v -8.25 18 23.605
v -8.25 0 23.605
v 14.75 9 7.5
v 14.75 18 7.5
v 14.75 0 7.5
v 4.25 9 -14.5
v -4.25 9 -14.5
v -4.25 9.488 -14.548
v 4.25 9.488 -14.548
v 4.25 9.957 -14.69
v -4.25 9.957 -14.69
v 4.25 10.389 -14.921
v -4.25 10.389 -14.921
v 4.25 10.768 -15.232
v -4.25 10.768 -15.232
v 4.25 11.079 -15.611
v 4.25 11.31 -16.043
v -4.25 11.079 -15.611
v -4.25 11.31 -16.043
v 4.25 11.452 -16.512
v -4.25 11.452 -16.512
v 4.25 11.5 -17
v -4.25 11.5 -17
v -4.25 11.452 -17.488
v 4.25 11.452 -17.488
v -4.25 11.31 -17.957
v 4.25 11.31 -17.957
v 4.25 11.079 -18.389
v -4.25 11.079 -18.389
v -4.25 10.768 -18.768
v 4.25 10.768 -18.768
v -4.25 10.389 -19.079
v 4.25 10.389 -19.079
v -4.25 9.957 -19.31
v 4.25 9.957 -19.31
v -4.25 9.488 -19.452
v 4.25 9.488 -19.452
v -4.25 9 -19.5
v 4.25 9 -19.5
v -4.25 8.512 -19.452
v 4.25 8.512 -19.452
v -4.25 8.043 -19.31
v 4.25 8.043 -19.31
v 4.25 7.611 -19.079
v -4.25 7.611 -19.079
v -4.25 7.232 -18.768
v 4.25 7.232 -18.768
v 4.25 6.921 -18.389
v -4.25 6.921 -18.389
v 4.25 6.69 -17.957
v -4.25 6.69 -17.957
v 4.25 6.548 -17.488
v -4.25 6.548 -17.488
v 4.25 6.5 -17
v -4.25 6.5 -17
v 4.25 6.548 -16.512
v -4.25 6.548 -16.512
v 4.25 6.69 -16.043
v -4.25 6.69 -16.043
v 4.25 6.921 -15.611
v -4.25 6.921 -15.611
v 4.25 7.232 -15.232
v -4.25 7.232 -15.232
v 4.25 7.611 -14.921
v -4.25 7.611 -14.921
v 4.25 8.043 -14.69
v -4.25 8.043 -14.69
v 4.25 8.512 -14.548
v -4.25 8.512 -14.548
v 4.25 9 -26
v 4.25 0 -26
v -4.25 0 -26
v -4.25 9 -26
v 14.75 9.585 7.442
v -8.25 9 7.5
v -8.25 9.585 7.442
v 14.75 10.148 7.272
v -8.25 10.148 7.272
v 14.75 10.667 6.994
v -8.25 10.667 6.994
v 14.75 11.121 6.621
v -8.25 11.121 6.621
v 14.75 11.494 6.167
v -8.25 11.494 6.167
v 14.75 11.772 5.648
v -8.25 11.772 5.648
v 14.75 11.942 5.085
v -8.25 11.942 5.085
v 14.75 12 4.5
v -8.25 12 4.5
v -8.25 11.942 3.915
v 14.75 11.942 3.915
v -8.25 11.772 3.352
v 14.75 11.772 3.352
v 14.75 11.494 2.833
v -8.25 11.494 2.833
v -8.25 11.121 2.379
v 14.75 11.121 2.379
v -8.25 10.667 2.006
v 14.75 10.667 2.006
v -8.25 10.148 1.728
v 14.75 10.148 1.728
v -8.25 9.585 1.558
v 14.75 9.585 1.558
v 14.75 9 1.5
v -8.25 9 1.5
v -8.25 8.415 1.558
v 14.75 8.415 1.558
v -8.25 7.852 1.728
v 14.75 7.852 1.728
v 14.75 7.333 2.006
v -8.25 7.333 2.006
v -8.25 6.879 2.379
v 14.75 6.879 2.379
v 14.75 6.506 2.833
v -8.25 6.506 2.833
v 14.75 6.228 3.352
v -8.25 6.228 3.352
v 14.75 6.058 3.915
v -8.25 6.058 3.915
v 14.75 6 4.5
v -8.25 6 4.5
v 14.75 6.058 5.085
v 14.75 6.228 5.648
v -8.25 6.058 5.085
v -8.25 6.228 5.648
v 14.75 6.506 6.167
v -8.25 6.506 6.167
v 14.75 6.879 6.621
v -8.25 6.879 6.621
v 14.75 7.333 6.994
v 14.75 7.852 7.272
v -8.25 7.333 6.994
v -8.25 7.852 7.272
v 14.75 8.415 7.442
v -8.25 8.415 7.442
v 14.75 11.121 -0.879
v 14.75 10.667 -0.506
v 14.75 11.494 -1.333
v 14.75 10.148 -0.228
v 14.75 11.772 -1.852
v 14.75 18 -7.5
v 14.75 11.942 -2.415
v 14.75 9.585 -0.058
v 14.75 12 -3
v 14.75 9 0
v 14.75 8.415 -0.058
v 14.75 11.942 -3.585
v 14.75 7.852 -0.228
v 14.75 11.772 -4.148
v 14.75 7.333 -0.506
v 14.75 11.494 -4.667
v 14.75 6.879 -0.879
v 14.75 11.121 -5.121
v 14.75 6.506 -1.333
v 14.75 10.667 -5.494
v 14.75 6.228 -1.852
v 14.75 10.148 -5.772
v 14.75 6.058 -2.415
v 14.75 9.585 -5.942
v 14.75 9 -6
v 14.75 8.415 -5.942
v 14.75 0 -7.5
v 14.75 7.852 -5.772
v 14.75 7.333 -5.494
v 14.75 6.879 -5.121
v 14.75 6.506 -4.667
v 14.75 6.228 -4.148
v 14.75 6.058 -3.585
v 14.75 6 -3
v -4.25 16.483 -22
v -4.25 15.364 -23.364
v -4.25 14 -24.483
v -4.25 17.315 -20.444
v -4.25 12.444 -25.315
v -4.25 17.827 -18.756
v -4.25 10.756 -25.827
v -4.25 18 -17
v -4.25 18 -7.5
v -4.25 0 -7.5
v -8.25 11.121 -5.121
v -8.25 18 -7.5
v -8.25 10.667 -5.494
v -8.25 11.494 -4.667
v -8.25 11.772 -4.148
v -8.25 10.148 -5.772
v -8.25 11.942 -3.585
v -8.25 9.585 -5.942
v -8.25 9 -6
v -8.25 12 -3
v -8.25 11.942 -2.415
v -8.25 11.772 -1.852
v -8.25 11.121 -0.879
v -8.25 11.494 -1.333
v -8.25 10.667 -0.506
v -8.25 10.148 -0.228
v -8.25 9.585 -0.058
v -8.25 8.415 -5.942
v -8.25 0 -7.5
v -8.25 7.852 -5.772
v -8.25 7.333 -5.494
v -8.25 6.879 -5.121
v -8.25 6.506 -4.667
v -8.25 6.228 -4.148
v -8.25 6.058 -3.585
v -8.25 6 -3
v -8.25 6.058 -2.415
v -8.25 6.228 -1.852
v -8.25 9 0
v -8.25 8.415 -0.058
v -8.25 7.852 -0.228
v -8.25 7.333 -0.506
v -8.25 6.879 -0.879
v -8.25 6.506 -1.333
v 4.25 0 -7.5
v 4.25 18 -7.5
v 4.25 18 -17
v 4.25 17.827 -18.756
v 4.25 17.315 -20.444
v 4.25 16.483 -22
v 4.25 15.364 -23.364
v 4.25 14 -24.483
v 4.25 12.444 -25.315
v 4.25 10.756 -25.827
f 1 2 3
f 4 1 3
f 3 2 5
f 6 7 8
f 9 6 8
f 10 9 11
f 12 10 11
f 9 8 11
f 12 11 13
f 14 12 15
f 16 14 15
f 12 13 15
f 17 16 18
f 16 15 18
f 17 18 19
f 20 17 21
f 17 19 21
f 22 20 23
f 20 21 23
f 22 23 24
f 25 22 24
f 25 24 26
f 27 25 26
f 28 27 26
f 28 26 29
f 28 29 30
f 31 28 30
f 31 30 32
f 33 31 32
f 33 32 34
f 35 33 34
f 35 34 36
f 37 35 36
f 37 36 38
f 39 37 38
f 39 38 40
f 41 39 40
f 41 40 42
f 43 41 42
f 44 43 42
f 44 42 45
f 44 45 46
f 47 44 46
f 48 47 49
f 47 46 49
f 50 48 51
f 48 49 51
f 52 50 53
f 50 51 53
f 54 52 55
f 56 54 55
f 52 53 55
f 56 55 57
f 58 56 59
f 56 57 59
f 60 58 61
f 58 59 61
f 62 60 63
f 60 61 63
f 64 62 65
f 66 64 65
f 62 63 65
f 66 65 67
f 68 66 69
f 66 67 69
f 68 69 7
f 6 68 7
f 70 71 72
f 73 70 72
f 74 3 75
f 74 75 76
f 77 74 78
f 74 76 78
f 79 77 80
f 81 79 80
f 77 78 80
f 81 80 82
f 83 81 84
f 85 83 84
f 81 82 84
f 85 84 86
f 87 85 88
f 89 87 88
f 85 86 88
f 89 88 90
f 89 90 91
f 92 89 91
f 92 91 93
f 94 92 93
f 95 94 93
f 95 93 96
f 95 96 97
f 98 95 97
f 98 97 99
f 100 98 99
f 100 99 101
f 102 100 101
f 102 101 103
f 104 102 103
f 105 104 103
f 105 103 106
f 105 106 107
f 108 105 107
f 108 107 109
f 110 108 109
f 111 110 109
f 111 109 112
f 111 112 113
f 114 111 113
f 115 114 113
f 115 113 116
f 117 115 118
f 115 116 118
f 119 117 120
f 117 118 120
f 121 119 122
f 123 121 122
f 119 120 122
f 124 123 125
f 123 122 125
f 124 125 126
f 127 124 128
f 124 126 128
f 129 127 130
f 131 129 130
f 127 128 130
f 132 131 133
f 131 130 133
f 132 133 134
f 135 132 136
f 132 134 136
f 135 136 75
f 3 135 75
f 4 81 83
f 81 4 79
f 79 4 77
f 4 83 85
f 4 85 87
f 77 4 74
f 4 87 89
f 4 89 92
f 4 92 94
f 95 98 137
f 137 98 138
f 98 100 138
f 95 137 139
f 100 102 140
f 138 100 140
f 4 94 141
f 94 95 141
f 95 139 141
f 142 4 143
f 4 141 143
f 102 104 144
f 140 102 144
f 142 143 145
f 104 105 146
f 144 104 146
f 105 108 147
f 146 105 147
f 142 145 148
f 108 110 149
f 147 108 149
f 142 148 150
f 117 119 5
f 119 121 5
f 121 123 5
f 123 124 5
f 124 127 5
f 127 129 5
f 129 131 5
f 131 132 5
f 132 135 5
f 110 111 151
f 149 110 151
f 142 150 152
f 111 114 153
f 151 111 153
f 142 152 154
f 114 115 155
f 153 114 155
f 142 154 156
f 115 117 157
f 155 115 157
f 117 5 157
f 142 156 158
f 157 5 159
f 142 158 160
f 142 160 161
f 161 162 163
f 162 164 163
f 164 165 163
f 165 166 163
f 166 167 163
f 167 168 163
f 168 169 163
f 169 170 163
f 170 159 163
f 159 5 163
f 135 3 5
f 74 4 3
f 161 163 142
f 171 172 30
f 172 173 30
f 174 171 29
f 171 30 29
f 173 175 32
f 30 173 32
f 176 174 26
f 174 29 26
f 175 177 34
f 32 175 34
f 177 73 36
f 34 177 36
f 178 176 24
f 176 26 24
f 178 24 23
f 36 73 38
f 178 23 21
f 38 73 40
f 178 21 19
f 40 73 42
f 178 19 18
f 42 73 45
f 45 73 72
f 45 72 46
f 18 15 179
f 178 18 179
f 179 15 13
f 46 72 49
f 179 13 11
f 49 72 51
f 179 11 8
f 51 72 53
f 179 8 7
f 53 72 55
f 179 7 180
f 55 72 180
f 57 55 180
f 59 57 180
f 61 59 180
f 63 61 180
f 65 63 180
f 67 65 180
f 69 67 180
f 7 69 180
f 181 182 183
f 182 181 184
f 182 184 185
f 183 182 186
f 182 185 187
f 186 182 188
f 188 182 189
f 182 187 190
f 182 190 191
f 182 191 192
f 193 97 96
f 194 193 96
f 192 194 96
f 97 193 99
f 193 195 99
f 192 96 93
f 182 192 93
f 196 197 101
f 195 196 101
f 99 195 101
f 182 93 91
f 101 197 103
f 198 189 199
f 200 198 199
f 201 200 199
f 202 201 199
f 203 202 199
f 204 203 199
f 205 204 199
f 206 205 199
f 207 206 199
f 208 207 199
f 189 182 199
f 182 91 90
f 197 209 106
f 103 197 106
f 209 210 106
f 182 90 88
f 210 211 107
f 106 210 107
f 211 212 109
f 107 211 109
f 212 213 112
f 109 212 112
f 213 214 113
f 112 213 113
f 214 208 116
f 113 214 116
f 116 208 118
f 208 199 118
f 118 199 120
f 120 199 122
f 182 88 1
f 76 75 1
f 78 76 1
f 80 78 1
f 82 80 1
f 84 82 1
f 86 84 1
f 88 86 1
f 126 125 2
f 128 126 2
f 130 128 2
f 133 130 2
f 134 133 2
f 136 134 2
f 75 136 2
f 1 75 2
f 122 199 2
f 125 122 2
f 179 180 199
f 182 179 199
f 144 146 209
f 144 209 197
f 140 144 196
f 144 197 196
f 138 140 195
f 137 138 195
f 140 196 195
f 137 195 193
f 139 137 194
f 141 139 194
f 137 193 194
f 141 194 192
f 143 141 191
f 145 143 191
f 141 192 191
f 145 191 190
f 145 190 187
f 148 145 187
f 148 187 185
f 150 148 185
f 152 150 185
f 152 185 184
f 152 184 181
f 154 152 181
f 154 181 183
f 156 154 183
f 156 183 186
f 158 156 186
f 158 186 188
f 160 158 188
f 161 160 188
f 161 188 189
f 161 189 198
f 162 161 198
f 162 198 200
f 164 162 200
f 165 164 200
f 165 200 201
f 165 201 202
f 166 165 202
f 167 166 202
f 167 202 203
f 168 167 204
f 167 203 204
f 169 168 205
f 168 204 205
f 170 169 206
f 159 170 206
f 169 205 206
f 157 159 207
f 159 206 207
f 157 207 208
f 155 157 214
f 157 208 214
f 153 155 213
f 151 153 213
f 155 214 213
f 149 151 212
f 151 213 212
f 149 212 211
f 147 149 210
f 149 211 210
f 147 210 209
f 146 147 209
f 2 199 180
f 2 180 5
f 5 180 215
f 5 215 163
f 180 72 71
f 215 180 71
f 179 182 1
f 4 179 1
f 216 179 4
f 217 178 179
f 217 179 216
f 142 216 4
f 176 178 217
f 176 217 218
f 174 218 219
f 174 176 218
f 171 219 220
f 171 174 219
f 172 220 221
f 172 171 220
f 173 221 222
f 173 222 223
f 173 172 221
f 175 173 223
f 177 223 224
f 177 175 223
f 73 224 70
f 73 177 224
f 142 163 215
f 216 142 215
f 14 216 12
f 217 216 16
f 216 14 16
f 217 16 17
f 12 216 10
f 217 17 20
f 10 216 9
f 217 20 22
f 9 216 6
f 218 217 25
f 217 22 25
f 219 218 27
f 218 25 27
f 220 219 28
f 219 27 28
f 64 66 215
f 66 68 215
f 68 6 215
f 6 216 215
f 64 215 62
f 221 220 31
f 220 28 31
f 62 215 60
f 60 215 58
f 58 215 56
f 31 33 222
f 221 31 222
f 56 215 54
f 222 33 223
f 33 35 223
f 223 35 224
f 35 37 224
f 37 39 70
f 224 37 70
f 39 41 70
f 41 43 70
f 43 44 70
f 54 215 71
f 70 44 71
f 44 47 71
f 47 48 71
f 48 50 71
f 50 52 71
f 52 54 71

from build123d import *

# Parameters (mm, degrees)
BOSS_EXTRUDE1_DEPTH = 18
SKETCH3_R           = 2.5
SKETCH3_R_2         = 3
CUT_EXTRUDE1_DEPTH  = 40.102429592


with BuildPart() as part:
    # Sketch1 → Boss-Extrude1 (new body)
    with BuildSketch(Plane(origin=(0, 0, 0), x_dir=(1, 0, 0), z_dir=(0, 1, 0))):
        Polygon((-8.25, 7.5), (-8.25, -23.604773379), (14.75, -7.5), (14.75, 7.5), (4.25, 7.5), (4.25, 26), (-4.25, 26), (-4.25, 7.5), align=None)
    extrude(amount=BOSS_EXTRUDE1_DEPTH)

    # Sketch3 → Cut-Extrude1 (cut, through all)
    with BuildSketch(Plane.ZY.offset(8.25)):
        with Locations((-17, 9)):
            Circle(SKETCH3_R)
        with Locations((-3, 9)):
            Circle(SKETCH3_R_2)
        with Locations((4.5, 9)):
            Circle(SKETCH3_R_2)
        with BuildLine():
            Line((-26, 9), (-26, 18))
            Line((-26, 18), (-17, 18))
            ThreePointArc((-17, 18), (-23.363961031, 15.363961031), (-26, 9))
        make_face()
    extrude(amount=-CUT_EXTRUDE1_DEPTH, mode=Mode.SUBTRACT)


solid = part.part
